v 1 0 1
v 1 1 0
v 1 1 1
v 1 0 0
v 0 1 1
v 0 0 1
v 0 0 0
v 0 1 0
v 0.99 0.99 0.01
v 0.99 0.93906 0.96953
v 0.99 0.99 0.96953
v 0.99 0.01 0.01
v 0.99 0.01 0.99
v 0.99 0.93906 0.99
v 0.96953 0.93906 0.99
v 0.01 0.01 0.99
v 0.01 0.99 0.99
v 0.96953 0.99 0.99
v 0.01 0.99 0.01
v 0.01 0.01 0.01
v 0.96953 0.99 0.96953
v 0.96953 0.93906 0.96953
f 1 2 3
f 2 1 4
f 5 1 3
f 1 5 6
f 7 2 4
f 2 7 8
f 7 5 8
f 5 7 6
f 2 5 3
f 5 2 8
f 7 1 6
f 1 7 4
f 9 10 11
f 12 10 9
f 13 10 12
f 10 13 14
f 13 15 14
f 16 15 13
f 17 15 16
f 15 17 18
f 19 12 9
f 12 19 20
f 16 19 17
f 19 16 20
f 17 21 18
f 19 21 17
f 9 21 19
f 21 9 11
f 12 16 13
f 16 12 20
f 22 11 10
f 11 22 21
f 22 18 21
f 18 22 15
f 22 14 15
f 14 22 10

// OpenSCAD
translate([0.984375, 0.96875, 0.984375]) color([0.8095890747672685, 0.42229724037802296, 0.8596823690614395]) cube([0.0296875, 0.059375, 0.0296875], center=true);
color([0.3,0.3,0.3,0.3]) difference() { cube([1,1,1]); translate([0.01,0.01,0.01]) cube([0.98,0.98,0.98]); }
